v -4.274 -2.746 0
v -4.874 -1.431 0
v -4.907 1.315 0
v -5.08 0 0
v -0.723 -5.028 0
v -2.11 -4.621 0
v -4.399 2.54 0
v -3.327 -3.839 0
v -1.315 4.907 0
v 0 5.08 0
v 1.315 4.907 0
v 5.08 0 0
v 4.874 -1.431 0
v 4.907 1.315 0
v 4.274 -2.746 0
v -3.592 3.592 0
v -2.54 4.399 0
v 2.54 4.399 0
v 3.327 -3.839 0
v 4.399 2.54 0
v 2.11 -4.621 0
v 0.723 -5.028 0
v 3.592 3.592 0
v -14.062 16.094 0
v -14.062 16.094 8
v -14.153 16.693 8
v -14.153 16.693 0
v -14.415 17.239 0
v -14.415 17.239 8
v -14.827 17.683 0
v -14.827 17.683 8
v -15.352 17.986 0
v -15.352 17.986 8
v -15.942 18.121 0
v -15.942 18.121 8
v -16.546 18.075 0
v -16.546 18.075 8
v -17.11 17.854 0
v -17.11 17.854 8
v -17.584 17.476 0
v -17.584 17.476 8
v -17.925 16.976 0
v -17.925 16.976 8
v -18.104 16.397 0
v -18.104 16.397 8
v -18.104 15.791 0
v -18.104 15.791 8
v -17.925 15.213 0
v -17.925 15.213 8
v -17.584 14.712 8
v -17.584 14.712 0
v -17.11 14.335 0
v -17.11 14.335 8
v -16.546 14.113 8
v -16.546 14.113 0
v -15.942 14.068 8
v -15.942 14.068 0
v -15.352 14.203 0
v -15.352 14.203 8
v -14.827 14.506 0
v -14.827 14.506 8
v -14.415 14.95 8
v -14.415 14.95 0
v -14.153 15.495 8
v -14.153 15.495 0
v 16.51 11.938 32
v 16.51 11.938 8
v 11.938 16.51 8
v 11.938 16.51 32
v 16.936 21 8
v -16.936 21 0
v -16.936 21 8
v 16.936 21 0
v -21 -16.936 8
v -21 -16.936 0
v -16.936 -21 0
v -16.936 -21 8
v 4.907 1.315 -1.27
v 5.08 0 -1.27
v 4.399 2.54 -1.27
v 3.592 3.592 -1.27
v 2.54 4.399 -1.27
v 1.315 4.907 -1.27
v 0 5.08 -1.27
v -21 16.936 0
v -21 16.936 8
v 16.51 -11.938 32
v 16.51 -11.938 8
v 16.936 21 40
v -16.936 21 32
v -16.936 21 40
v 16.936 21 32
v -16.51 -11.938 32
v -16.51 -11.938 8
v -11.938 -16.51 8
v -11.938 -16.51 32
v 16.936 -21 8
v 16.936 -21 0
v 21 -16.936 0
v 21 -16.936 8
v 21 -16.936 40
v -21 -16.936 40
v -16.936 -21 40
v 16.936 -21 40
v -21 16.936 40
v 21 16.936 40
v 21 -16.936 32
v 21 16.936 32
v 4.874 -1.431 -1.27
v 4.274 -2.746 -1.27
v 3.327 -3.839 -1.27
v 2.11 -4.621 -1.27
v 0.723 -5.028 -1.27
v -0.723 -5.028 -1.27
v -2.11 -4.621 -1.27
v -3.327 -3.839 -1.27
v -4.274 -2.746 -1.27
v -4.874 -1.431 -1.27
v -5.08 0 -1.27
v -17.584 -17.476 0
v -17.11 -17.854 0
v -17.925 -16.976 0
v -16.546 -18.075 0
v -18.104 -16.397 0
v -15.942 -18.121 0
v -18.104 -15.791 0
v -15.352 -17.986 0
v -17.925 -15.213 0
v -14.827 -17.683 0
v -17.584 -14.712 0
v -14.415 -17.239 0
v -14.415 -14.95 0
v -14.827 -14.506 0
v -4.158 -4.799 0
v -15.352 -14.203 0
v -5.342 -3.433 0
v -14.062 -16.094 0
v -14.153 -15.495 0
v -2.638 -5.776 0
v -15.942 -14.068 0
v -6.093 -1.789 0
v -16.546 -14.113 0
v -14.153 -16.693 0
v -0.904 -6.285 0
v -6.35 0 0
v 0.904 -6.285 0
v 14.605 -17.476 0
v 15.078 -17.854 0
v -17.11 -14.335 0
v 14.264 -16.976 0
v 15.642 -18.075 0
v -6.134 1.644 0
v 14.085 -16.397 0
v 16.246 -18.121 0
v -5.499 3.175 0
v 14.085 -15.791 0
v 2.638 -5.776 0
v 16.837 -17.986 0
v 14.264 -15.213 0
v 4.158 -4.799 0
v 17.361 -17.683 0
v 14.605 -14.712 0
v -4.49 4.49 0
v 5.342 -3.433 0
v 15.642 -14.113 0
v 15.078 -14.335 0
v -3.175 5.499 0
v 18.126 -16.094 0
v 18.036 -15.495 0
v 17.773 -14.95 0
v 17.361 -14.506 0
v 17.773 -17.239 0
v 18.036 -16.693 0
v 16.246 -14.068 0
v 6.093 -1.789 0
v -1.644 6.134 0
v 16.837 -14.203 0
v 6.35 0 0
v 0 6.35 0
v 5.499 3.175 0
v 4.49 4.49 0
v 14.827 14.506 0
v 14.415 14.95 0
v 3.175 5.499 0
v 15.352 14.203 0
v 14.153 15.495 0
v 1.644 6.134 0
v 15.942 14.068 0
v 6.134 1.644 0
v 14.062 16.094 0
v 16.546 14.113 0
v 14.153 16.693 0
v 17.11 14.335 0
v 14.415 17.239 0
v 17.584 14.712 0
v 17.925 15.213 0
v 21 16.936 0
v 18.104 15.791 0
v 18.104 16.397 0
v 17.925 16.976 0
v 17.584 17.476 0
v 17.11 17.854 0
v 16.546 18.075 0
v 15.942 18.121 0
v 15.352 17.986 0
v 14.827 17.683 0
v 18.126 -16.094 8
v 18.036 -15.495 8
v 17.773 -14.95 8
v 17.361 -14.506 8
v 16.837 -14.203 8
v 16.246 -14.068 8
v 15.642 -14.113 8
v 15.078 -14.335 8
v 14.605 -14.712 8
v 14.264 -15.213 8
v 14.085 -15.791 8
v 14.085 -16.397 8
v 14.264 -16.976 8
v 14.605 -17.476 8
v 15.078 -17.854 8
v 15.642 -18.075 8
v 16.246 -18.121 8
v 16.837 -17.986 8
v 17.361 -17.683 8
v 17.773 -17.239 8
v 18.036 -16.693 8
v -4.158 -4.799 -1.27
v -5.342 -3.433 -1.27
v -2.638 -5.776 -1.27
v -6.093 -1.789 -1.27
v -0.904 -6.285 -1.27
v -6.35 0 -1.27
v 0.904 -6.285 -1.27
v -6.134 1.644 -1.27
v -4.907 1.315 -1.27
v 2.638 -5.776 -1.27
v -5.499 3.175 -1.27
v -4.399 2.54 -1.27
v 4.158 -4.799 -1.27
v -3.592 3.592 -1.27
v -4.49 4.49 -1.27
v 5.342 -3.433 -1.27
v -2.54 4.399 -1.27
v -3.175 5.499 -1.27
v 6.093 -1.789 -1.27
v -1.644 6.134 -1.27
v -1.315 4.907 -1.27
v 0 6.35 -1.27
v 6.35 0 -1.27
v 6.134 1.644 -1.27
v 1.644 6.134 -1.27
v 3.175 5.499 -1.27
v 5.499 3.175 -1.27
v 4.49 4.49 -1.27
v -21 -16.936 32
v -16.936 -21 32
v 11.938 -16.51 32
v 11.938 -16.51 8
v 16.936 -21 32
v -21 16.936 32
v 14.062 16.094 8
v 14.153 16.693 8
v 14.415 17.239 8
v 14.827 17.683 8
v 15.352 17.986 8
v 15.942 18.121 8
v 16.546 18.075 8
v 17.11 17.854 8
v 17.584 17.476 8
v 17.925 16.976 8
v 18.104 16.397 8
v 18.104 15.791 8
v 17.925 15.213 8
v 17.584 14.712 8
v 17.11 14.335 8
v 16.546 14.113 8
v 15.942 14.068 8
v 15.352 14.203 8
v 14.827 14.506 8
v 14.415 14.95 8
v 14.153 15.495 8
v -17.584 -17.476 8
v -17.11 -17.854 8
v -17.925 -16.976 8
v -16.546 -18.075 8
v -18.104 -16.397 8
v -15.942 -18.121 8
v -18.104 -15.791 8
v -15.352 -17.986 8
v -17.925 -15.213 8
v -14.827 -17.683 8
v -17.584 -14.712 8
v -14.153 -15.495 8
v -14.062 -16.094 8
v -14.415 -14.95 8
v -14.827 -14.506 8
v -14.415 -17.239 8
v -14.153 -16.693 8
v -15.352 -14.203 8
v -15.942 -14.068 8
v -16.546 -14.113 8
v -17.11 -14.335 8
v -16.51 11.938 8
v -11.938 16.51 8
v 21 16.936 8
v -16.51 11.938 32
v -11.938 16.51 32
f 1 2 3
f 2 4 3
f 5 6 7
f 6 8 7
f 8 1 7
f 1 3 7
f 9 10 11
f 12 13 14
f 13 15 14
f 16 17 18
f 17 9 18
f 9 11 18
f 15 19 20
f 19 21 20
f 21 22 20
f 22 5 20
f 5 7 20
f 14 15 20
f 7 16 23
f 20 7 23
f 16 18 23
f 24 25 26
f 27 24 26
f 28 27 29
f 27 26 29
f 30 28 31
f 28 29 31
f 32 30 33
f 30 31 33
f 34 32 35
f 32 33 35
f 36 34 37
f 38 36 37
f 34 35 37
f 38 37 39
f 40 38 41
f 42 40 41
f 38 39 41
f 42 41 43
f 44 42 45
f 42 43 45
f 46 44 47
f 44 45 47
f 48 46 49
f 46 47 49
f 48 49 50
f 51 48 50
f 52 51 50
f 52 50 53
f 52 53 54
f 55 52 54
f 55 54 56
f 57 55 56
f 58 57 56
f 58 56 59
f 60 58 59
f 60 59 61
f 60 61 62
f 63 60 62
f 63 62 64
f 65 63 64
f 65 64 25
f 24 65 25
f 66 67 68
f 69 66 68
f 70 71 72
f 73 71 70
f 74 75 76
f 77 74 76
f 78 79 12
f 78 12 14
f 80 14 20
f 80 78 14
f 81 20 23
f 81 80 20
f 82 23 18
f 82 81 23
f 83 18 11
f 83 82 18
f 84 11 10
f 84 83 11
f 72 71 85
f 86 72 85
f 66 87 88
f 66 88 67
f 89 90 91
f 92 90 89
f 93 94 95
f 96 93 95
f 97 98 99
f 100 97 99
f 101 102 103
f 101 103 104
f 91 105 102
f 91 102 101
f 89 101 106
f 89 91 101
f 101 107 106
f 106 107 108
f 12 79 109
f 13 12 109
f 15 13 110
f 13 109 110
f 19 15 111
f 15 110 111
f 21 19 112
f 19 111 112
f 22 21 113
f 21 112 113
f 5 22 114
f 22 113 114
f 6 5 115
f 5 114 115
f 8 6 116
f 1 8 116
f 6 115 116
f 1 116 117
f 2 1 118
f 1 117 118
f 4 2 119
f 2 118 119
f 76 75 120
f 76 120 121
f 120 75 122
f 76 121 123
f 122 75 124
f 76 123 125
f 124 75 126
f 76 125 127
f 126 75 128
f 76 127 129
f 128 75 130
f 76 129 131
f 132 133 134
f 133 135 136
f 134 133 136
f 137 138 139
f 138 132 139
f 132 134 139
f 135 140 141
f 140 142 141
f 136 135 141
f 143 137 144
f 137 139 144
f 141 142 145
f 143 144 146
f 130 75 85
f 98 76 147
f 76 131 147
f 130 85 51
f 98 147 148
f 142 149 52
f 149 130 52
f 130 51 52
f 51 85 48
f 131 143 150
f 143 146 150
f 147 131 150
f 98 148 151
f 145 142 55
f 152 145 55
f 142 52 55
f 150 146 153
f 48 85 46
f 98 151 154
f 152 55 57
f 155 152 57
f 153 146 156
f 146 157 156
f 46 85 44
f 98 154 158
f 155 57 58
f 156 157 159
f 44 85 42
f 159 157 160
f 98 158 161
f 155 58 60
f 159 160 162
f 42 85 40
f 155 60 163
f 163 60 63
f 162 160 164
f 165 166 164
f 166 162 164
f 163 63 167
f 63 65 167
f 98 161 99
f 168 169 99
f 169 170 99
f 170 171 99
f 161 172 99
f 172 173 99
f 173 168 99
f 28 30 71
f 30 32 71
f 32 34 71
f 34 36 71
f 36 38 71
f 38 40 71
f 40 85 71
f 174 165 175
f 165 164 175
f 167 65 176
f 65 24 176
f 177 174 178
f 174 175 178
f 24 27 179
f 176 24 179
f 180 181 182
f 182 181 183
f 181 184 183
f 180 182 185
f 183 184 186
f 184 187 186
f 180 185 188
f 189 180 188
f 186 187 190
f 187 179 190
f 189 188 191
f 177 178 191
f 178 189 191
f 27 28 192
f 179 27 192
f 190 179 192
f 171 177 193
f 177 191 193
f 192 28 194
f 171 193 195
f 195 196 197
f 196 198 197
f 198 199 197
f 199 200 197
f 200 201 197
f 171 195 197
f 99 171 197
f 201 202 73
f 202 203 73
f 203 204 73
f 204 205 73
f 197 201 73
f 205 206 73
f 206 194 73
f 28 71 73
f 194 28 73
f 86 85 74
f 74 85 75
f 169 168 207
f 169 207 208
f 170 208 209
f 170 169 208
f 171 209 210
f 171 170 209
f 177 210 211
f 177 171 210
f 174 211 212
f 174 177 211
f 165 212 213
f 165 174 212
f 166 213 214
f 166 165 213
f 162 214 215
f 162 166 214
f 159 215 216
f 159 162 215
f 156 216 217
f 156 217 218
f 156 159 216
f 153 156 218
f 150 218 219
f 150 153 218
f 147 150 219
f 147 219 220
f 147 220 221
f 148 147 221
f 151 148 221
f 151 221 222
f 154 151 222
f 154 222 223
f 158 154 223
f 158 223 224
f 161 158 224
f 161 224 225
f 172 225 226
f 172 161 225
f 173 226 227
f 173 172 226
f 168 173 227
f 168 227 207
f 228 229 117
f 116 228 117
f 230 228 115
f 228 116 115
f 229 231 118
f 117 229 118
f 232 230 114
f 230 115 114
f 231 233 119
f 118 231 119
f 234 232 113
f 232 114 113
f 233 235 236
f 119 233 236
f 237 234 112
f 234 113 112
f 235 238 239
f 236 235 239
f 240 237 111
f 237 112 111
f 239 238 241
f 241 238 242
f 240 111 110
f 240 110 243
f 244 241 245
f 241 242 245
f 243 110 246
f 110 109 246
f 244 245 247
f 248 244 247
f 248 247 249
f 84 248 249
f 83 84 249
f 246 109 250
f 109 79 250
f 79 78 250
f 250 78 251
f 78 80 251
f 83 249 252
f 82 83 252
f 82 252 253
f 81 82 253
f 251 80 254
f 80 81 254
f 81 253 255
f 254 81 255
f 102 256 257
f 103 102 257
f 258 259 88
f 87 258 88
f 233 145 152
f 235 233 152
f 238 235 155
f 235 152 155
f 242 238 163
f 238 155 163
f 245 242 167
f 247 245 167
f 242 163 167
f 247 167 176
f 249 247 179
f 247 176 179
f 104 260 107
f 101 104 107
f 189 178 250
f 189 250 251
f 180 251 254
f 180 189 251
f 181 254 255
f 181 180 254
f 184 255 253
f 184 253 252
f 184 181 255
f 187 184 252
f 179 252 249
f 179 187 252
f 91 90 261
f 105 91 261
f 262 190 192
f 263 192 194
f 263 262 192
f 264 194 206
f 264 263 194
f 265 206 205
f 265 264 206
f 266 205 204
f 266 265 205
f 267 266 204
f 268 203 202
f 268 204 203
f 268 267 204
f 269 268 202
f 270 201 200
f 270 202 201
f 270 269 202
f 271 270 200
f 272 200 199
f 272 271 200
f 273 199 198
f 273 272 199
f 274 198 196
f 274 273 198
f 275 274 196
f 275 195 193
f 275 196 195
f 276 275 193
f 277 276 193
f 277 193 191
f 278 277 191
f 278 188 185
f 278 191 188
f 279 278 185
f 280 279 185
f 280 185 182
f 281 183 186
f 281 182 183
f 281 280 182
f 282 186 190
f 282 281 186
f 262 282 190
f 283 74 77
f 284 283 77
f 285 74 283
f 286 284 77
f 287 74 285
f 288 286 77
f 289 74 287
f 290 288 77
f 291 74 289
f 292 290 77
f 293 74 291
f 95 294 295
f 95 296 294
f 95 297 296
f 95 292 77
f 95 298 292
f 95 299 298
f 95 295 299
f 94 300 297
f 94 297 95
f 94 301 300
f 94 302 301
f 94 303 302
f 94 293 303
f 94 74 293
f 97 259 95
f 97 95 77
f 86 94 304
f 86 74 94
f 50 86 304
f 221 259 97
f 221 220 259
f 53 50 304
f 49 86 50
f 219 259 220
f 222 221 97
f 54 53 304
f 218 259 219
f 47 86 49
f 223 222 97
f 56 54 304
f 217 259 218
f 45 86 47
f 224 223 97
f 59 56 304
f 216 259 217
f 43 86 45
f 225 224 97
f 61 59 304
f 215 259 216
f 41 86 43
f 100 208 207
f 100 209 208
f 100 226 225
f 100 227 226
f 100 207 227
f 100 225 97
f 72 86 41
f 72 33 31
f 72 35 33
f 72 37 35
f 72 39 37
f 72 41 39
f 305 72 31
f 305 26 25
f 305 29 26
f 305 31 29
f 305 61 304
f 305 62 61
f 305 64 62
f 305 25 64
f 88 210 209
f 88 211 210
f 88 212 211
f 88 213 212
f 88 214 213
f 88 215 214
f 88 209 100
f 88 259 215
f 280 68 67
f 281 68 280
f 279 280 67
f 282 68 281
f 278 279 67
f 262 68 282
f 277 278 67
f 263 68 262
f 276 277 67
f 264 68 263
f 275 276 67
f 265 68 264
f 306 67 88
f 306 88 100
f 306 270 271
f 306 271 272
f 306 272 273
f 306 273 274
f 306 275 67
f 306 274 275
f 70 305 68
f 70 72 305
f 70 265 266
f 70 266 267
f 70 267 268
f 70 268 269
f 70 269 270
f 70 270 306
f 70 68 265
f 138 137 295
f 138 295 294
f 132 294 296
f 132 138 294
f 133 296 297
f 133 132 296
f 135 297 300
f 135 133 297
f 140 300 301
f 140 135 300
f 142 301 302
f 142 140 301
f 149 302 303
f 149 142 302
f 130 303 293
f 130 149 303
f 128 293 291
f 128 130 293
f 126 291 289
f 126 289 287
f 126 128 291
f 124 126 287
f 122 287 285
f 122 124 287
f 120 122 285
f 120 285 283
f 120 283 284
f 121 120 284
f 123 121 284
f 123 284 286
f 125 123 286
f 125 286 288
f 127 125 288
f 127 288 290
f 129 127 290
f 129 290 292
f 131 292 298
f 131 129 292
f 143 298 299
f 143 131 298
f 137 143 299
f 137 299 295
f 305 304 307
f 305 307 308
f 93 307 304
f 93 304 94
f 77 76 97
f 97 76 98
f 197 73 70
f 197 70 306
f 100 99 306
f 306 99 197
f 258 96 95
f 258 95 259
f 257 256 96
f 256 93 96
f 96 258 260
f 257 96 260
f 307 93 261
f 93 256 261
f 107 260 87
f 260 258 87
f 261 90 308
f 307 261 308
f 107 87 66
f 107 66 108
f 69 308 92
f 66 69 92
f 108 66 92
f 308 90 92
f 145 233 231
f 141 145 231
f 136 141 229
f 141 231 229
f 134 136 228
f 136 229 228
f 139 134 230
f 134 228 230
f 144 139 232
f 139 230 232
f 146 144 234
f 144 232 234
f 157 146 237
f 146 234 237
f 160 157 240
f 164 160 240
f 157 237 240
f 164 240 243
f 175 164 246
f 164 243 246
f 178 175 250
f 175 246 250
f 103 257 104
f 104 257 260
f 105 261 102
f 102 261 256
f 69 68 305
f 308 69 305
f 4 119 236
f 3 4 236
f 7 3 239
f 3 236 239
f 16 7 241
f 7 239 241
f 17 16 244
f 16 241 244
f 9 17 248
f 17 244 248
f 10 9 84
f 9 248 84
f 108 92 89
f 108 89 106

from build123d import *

# Parameters (mm, degrees)
BOSS_EXTRUDE1_DEPTH = 8
SKETCH2_R           = 2.032
CUT_EXTRUDE1_DEPTH  = 14.144
BOSS_EXTRUDE2_DEPTH = 24
BOSS_EXTRUDE3_DEPTH = 8
BOSS_EXTRUDE4_DEPTH = 1.27
CUT_EXTRUDE2_DEPTH  = 1.27
MIRROR2_DEPTH       = 40
MIRROR2_START       = 32
MIRROR2_2_DEPTH     = 8
MIRROR2_3_OUTLINE_R = 2.032
MIRROR2_3_DEPTH     = 8
MIRROR2_START_2     = -1.27
MIRROR2_4_DEPTH     = 1.27


# Read off the part's stored shape, not the designer's step: Mirror2
with BuildPart() as part:
    # Sketch1 → Boss-Extrude1 (new body)
    with BuildSketch(Plane.XY):
        Polygon((-21, 16.936), (-21, 0), (0, 0), (0, 21), (-16.936, 21), align=None)
    boss_extrude1 = extrude(amount=BOSS_EXTRUDE1_DEPTH)

    # Sketch2 → Cut-Extrude1 (cut)
    with BuildSketch(Plane.XY.offset(8)):
        with Locations((-16.094318041, 16.094318041)):
            Circle(SKETCH2_R)
    cut_extrude1 = extrude(amount=-CUT_EXTRUDE1_DEPTH, mode=Mode.SUBTRACT)

    # Sketch4 → Boss-Extrude2 (add)
    with BuildSketch(Plane.XY.offset(8)):
        Polygon((0, 0), (-16.51, 0), (-16.51, 11.938), (-11.938, 16.51), (0, 16.51), align=None)
    boss_extrude2 = extrude(amount=BOSS_EXTRUDE2_DEPTH)

    # Sketch5 → Boss-Extrude3 (add)
    with BuildSketch(Plane.XY.offset(32)):
        Polygon((0, 0), (0, 21), (-16.936, 21), (-21, 16.936), (-21, 0), align=None)
    boss_extrude3 = extrude(amount=BOSS_EXTRUDE3_DEPTH)

    # Sketch6 → Boss-Extrude4 (add)
    with BuildSketch(Plane(origin=(0, 0, 0), x_dir=(-1, 0, 0), z_dir=(0, 0, -1))):
        with BuildLine():
            Line((0, 6.35), (0, 0))
            Line((0, 0), (6.35, 0))
            ThreePointArc((6.35, 0), (4.490128061, 4.490128061), (0, 6.35))
        make_face()
    boss_extrude4 = extrude(amount=BOSS_EXTRUDE4_DEPTH)

    # Sketch7 → Cut-Extrude2 (cut)
    with BuildSketch(Plane(origin=(0, 0, -1.27), x_dir=(-1, 0, 0), z_dir=(0, 0, -1))):
        with BuildLine():
            Line((0, 5.08), (0, 0))
            Line((0, 0), (5.08, 0))
            ThreePointArc((5.08, 0), (3.592102448, 3.592102448), (0, 5.08))
        make_face()
    cut_extrude2 = extrude(amount=-CUT_EXTRUDE2_DEPTH, mode=Mode.SUBTRACT)

    # Mirror1: Boss-Extrude1, Cut-Extrude1, Boss-Extrude2, Boss-Extrude3, Boss-Extrude4, Cut-Extrude2 across Right Plane
    add(boss_extrude1.mirror(Plane(origin=(0, 0, 0), x_dir=(0, 0, -1), z_dir=(1, 0, 0))))
    add(cut_extrude1.mirror(Plane(origin=(0, 0, 0), x_dir=(0, 0, -1), z_dir=(1, 0, 0))), mode=Mode.SUBTRACT)
    add(boss_extrude2.mirror(Plane(origin=(0, 0, 0), x_dir=(0, 0, -1), z_dir=(1, 0, 0))))
    add(boss_extrude3.mirror(Plane(origin=(0, 0, 0), x_dir=(0, 0, -1), z_dir=(1, 0, 0))))
    add(boss_extrude4.mirror(Plane(origin=(0, 0, 0), x_dir=(0, 0, -1), z_dir=(1, 0, 0))))
    add(cut_extrude2.mirror(Plane(origin=(0, 0, 0), x_dir=(0, 0, -1), z_dir=(1, 0, 0))), mode=Mode.SUBTRACT)

    # Mirror2 outline → Mirror2 (add)
    with BuildSketch(Plane.XY):
        Polygon((-16.51, 0), (-16.51, -11.938), (-11.938, -16.51), (11.938, -16.51), (16.51, -11.938), (16.51, 0), align=None)
    extrude(amount=MIRROR2_DEPTH)

    # Mirror2 2 outline → Mirror2 2 (add)
    with BuildSketch(Plane.XY.offset(MIRROR2_START)):
        Polygon((-21, 0), (-21, -16.936), (-16.936, -21), (16.936, -21), (21, -16.936), (21, 0), (16.51, 0), (16.51, -11.938), (11.938, -16.51), (-11.938, -16.51), (-16.51, -11.938), (-16.51, 0), align=None)
    extrude(amount=MIRROR2_2_DEPTH)

    # Mirror2 3 outline → Mirror2 3 (add)
    with BuildSketch(Plane.XY):
        Polygon((-21, 0), (-21, -16.936), (-16.936, -21), (16.936, -21), (21, -16.936), (21, 0), (16.51, 0), (16.51, -11.938), (11.938, -16.51), (-11.938, -16.51), (-16.51, -11.938), (-16.51, 0), align=None)
        with Locations((-16.094318041, -16.094318041)):
            Circle(MIRROR2_3_OUTLINE_R, mode=Mode.SUBTRACT)
        with Locations((16.094318041, -16.094318041)):
            Circle(MIRROR2_3_OUTLINE_R, mode=Mode.SUBTRACT)
    extrude(amount=MIRROR2_3_DEPTH)

    # Mirror2 4 outline → Mirror2 4 (add)
    with BuildSketch(Plane.XY.offset(MIRROR2_START_2)):
        with BuildLine():
            Line((-5.08, 0), (-6.35, 0))
            ThreePointArc((-6.35, 0), (0, -6.35), (6.35, 0))
            Line((6.35, 0), (5.08, 0))
            ThreePointArc((5.08, 0), (0, -5.08), (-5.08, 0))
        make_face()
    extrude(amount=MIRROR2_4_DEPTH)


solid = part.part
